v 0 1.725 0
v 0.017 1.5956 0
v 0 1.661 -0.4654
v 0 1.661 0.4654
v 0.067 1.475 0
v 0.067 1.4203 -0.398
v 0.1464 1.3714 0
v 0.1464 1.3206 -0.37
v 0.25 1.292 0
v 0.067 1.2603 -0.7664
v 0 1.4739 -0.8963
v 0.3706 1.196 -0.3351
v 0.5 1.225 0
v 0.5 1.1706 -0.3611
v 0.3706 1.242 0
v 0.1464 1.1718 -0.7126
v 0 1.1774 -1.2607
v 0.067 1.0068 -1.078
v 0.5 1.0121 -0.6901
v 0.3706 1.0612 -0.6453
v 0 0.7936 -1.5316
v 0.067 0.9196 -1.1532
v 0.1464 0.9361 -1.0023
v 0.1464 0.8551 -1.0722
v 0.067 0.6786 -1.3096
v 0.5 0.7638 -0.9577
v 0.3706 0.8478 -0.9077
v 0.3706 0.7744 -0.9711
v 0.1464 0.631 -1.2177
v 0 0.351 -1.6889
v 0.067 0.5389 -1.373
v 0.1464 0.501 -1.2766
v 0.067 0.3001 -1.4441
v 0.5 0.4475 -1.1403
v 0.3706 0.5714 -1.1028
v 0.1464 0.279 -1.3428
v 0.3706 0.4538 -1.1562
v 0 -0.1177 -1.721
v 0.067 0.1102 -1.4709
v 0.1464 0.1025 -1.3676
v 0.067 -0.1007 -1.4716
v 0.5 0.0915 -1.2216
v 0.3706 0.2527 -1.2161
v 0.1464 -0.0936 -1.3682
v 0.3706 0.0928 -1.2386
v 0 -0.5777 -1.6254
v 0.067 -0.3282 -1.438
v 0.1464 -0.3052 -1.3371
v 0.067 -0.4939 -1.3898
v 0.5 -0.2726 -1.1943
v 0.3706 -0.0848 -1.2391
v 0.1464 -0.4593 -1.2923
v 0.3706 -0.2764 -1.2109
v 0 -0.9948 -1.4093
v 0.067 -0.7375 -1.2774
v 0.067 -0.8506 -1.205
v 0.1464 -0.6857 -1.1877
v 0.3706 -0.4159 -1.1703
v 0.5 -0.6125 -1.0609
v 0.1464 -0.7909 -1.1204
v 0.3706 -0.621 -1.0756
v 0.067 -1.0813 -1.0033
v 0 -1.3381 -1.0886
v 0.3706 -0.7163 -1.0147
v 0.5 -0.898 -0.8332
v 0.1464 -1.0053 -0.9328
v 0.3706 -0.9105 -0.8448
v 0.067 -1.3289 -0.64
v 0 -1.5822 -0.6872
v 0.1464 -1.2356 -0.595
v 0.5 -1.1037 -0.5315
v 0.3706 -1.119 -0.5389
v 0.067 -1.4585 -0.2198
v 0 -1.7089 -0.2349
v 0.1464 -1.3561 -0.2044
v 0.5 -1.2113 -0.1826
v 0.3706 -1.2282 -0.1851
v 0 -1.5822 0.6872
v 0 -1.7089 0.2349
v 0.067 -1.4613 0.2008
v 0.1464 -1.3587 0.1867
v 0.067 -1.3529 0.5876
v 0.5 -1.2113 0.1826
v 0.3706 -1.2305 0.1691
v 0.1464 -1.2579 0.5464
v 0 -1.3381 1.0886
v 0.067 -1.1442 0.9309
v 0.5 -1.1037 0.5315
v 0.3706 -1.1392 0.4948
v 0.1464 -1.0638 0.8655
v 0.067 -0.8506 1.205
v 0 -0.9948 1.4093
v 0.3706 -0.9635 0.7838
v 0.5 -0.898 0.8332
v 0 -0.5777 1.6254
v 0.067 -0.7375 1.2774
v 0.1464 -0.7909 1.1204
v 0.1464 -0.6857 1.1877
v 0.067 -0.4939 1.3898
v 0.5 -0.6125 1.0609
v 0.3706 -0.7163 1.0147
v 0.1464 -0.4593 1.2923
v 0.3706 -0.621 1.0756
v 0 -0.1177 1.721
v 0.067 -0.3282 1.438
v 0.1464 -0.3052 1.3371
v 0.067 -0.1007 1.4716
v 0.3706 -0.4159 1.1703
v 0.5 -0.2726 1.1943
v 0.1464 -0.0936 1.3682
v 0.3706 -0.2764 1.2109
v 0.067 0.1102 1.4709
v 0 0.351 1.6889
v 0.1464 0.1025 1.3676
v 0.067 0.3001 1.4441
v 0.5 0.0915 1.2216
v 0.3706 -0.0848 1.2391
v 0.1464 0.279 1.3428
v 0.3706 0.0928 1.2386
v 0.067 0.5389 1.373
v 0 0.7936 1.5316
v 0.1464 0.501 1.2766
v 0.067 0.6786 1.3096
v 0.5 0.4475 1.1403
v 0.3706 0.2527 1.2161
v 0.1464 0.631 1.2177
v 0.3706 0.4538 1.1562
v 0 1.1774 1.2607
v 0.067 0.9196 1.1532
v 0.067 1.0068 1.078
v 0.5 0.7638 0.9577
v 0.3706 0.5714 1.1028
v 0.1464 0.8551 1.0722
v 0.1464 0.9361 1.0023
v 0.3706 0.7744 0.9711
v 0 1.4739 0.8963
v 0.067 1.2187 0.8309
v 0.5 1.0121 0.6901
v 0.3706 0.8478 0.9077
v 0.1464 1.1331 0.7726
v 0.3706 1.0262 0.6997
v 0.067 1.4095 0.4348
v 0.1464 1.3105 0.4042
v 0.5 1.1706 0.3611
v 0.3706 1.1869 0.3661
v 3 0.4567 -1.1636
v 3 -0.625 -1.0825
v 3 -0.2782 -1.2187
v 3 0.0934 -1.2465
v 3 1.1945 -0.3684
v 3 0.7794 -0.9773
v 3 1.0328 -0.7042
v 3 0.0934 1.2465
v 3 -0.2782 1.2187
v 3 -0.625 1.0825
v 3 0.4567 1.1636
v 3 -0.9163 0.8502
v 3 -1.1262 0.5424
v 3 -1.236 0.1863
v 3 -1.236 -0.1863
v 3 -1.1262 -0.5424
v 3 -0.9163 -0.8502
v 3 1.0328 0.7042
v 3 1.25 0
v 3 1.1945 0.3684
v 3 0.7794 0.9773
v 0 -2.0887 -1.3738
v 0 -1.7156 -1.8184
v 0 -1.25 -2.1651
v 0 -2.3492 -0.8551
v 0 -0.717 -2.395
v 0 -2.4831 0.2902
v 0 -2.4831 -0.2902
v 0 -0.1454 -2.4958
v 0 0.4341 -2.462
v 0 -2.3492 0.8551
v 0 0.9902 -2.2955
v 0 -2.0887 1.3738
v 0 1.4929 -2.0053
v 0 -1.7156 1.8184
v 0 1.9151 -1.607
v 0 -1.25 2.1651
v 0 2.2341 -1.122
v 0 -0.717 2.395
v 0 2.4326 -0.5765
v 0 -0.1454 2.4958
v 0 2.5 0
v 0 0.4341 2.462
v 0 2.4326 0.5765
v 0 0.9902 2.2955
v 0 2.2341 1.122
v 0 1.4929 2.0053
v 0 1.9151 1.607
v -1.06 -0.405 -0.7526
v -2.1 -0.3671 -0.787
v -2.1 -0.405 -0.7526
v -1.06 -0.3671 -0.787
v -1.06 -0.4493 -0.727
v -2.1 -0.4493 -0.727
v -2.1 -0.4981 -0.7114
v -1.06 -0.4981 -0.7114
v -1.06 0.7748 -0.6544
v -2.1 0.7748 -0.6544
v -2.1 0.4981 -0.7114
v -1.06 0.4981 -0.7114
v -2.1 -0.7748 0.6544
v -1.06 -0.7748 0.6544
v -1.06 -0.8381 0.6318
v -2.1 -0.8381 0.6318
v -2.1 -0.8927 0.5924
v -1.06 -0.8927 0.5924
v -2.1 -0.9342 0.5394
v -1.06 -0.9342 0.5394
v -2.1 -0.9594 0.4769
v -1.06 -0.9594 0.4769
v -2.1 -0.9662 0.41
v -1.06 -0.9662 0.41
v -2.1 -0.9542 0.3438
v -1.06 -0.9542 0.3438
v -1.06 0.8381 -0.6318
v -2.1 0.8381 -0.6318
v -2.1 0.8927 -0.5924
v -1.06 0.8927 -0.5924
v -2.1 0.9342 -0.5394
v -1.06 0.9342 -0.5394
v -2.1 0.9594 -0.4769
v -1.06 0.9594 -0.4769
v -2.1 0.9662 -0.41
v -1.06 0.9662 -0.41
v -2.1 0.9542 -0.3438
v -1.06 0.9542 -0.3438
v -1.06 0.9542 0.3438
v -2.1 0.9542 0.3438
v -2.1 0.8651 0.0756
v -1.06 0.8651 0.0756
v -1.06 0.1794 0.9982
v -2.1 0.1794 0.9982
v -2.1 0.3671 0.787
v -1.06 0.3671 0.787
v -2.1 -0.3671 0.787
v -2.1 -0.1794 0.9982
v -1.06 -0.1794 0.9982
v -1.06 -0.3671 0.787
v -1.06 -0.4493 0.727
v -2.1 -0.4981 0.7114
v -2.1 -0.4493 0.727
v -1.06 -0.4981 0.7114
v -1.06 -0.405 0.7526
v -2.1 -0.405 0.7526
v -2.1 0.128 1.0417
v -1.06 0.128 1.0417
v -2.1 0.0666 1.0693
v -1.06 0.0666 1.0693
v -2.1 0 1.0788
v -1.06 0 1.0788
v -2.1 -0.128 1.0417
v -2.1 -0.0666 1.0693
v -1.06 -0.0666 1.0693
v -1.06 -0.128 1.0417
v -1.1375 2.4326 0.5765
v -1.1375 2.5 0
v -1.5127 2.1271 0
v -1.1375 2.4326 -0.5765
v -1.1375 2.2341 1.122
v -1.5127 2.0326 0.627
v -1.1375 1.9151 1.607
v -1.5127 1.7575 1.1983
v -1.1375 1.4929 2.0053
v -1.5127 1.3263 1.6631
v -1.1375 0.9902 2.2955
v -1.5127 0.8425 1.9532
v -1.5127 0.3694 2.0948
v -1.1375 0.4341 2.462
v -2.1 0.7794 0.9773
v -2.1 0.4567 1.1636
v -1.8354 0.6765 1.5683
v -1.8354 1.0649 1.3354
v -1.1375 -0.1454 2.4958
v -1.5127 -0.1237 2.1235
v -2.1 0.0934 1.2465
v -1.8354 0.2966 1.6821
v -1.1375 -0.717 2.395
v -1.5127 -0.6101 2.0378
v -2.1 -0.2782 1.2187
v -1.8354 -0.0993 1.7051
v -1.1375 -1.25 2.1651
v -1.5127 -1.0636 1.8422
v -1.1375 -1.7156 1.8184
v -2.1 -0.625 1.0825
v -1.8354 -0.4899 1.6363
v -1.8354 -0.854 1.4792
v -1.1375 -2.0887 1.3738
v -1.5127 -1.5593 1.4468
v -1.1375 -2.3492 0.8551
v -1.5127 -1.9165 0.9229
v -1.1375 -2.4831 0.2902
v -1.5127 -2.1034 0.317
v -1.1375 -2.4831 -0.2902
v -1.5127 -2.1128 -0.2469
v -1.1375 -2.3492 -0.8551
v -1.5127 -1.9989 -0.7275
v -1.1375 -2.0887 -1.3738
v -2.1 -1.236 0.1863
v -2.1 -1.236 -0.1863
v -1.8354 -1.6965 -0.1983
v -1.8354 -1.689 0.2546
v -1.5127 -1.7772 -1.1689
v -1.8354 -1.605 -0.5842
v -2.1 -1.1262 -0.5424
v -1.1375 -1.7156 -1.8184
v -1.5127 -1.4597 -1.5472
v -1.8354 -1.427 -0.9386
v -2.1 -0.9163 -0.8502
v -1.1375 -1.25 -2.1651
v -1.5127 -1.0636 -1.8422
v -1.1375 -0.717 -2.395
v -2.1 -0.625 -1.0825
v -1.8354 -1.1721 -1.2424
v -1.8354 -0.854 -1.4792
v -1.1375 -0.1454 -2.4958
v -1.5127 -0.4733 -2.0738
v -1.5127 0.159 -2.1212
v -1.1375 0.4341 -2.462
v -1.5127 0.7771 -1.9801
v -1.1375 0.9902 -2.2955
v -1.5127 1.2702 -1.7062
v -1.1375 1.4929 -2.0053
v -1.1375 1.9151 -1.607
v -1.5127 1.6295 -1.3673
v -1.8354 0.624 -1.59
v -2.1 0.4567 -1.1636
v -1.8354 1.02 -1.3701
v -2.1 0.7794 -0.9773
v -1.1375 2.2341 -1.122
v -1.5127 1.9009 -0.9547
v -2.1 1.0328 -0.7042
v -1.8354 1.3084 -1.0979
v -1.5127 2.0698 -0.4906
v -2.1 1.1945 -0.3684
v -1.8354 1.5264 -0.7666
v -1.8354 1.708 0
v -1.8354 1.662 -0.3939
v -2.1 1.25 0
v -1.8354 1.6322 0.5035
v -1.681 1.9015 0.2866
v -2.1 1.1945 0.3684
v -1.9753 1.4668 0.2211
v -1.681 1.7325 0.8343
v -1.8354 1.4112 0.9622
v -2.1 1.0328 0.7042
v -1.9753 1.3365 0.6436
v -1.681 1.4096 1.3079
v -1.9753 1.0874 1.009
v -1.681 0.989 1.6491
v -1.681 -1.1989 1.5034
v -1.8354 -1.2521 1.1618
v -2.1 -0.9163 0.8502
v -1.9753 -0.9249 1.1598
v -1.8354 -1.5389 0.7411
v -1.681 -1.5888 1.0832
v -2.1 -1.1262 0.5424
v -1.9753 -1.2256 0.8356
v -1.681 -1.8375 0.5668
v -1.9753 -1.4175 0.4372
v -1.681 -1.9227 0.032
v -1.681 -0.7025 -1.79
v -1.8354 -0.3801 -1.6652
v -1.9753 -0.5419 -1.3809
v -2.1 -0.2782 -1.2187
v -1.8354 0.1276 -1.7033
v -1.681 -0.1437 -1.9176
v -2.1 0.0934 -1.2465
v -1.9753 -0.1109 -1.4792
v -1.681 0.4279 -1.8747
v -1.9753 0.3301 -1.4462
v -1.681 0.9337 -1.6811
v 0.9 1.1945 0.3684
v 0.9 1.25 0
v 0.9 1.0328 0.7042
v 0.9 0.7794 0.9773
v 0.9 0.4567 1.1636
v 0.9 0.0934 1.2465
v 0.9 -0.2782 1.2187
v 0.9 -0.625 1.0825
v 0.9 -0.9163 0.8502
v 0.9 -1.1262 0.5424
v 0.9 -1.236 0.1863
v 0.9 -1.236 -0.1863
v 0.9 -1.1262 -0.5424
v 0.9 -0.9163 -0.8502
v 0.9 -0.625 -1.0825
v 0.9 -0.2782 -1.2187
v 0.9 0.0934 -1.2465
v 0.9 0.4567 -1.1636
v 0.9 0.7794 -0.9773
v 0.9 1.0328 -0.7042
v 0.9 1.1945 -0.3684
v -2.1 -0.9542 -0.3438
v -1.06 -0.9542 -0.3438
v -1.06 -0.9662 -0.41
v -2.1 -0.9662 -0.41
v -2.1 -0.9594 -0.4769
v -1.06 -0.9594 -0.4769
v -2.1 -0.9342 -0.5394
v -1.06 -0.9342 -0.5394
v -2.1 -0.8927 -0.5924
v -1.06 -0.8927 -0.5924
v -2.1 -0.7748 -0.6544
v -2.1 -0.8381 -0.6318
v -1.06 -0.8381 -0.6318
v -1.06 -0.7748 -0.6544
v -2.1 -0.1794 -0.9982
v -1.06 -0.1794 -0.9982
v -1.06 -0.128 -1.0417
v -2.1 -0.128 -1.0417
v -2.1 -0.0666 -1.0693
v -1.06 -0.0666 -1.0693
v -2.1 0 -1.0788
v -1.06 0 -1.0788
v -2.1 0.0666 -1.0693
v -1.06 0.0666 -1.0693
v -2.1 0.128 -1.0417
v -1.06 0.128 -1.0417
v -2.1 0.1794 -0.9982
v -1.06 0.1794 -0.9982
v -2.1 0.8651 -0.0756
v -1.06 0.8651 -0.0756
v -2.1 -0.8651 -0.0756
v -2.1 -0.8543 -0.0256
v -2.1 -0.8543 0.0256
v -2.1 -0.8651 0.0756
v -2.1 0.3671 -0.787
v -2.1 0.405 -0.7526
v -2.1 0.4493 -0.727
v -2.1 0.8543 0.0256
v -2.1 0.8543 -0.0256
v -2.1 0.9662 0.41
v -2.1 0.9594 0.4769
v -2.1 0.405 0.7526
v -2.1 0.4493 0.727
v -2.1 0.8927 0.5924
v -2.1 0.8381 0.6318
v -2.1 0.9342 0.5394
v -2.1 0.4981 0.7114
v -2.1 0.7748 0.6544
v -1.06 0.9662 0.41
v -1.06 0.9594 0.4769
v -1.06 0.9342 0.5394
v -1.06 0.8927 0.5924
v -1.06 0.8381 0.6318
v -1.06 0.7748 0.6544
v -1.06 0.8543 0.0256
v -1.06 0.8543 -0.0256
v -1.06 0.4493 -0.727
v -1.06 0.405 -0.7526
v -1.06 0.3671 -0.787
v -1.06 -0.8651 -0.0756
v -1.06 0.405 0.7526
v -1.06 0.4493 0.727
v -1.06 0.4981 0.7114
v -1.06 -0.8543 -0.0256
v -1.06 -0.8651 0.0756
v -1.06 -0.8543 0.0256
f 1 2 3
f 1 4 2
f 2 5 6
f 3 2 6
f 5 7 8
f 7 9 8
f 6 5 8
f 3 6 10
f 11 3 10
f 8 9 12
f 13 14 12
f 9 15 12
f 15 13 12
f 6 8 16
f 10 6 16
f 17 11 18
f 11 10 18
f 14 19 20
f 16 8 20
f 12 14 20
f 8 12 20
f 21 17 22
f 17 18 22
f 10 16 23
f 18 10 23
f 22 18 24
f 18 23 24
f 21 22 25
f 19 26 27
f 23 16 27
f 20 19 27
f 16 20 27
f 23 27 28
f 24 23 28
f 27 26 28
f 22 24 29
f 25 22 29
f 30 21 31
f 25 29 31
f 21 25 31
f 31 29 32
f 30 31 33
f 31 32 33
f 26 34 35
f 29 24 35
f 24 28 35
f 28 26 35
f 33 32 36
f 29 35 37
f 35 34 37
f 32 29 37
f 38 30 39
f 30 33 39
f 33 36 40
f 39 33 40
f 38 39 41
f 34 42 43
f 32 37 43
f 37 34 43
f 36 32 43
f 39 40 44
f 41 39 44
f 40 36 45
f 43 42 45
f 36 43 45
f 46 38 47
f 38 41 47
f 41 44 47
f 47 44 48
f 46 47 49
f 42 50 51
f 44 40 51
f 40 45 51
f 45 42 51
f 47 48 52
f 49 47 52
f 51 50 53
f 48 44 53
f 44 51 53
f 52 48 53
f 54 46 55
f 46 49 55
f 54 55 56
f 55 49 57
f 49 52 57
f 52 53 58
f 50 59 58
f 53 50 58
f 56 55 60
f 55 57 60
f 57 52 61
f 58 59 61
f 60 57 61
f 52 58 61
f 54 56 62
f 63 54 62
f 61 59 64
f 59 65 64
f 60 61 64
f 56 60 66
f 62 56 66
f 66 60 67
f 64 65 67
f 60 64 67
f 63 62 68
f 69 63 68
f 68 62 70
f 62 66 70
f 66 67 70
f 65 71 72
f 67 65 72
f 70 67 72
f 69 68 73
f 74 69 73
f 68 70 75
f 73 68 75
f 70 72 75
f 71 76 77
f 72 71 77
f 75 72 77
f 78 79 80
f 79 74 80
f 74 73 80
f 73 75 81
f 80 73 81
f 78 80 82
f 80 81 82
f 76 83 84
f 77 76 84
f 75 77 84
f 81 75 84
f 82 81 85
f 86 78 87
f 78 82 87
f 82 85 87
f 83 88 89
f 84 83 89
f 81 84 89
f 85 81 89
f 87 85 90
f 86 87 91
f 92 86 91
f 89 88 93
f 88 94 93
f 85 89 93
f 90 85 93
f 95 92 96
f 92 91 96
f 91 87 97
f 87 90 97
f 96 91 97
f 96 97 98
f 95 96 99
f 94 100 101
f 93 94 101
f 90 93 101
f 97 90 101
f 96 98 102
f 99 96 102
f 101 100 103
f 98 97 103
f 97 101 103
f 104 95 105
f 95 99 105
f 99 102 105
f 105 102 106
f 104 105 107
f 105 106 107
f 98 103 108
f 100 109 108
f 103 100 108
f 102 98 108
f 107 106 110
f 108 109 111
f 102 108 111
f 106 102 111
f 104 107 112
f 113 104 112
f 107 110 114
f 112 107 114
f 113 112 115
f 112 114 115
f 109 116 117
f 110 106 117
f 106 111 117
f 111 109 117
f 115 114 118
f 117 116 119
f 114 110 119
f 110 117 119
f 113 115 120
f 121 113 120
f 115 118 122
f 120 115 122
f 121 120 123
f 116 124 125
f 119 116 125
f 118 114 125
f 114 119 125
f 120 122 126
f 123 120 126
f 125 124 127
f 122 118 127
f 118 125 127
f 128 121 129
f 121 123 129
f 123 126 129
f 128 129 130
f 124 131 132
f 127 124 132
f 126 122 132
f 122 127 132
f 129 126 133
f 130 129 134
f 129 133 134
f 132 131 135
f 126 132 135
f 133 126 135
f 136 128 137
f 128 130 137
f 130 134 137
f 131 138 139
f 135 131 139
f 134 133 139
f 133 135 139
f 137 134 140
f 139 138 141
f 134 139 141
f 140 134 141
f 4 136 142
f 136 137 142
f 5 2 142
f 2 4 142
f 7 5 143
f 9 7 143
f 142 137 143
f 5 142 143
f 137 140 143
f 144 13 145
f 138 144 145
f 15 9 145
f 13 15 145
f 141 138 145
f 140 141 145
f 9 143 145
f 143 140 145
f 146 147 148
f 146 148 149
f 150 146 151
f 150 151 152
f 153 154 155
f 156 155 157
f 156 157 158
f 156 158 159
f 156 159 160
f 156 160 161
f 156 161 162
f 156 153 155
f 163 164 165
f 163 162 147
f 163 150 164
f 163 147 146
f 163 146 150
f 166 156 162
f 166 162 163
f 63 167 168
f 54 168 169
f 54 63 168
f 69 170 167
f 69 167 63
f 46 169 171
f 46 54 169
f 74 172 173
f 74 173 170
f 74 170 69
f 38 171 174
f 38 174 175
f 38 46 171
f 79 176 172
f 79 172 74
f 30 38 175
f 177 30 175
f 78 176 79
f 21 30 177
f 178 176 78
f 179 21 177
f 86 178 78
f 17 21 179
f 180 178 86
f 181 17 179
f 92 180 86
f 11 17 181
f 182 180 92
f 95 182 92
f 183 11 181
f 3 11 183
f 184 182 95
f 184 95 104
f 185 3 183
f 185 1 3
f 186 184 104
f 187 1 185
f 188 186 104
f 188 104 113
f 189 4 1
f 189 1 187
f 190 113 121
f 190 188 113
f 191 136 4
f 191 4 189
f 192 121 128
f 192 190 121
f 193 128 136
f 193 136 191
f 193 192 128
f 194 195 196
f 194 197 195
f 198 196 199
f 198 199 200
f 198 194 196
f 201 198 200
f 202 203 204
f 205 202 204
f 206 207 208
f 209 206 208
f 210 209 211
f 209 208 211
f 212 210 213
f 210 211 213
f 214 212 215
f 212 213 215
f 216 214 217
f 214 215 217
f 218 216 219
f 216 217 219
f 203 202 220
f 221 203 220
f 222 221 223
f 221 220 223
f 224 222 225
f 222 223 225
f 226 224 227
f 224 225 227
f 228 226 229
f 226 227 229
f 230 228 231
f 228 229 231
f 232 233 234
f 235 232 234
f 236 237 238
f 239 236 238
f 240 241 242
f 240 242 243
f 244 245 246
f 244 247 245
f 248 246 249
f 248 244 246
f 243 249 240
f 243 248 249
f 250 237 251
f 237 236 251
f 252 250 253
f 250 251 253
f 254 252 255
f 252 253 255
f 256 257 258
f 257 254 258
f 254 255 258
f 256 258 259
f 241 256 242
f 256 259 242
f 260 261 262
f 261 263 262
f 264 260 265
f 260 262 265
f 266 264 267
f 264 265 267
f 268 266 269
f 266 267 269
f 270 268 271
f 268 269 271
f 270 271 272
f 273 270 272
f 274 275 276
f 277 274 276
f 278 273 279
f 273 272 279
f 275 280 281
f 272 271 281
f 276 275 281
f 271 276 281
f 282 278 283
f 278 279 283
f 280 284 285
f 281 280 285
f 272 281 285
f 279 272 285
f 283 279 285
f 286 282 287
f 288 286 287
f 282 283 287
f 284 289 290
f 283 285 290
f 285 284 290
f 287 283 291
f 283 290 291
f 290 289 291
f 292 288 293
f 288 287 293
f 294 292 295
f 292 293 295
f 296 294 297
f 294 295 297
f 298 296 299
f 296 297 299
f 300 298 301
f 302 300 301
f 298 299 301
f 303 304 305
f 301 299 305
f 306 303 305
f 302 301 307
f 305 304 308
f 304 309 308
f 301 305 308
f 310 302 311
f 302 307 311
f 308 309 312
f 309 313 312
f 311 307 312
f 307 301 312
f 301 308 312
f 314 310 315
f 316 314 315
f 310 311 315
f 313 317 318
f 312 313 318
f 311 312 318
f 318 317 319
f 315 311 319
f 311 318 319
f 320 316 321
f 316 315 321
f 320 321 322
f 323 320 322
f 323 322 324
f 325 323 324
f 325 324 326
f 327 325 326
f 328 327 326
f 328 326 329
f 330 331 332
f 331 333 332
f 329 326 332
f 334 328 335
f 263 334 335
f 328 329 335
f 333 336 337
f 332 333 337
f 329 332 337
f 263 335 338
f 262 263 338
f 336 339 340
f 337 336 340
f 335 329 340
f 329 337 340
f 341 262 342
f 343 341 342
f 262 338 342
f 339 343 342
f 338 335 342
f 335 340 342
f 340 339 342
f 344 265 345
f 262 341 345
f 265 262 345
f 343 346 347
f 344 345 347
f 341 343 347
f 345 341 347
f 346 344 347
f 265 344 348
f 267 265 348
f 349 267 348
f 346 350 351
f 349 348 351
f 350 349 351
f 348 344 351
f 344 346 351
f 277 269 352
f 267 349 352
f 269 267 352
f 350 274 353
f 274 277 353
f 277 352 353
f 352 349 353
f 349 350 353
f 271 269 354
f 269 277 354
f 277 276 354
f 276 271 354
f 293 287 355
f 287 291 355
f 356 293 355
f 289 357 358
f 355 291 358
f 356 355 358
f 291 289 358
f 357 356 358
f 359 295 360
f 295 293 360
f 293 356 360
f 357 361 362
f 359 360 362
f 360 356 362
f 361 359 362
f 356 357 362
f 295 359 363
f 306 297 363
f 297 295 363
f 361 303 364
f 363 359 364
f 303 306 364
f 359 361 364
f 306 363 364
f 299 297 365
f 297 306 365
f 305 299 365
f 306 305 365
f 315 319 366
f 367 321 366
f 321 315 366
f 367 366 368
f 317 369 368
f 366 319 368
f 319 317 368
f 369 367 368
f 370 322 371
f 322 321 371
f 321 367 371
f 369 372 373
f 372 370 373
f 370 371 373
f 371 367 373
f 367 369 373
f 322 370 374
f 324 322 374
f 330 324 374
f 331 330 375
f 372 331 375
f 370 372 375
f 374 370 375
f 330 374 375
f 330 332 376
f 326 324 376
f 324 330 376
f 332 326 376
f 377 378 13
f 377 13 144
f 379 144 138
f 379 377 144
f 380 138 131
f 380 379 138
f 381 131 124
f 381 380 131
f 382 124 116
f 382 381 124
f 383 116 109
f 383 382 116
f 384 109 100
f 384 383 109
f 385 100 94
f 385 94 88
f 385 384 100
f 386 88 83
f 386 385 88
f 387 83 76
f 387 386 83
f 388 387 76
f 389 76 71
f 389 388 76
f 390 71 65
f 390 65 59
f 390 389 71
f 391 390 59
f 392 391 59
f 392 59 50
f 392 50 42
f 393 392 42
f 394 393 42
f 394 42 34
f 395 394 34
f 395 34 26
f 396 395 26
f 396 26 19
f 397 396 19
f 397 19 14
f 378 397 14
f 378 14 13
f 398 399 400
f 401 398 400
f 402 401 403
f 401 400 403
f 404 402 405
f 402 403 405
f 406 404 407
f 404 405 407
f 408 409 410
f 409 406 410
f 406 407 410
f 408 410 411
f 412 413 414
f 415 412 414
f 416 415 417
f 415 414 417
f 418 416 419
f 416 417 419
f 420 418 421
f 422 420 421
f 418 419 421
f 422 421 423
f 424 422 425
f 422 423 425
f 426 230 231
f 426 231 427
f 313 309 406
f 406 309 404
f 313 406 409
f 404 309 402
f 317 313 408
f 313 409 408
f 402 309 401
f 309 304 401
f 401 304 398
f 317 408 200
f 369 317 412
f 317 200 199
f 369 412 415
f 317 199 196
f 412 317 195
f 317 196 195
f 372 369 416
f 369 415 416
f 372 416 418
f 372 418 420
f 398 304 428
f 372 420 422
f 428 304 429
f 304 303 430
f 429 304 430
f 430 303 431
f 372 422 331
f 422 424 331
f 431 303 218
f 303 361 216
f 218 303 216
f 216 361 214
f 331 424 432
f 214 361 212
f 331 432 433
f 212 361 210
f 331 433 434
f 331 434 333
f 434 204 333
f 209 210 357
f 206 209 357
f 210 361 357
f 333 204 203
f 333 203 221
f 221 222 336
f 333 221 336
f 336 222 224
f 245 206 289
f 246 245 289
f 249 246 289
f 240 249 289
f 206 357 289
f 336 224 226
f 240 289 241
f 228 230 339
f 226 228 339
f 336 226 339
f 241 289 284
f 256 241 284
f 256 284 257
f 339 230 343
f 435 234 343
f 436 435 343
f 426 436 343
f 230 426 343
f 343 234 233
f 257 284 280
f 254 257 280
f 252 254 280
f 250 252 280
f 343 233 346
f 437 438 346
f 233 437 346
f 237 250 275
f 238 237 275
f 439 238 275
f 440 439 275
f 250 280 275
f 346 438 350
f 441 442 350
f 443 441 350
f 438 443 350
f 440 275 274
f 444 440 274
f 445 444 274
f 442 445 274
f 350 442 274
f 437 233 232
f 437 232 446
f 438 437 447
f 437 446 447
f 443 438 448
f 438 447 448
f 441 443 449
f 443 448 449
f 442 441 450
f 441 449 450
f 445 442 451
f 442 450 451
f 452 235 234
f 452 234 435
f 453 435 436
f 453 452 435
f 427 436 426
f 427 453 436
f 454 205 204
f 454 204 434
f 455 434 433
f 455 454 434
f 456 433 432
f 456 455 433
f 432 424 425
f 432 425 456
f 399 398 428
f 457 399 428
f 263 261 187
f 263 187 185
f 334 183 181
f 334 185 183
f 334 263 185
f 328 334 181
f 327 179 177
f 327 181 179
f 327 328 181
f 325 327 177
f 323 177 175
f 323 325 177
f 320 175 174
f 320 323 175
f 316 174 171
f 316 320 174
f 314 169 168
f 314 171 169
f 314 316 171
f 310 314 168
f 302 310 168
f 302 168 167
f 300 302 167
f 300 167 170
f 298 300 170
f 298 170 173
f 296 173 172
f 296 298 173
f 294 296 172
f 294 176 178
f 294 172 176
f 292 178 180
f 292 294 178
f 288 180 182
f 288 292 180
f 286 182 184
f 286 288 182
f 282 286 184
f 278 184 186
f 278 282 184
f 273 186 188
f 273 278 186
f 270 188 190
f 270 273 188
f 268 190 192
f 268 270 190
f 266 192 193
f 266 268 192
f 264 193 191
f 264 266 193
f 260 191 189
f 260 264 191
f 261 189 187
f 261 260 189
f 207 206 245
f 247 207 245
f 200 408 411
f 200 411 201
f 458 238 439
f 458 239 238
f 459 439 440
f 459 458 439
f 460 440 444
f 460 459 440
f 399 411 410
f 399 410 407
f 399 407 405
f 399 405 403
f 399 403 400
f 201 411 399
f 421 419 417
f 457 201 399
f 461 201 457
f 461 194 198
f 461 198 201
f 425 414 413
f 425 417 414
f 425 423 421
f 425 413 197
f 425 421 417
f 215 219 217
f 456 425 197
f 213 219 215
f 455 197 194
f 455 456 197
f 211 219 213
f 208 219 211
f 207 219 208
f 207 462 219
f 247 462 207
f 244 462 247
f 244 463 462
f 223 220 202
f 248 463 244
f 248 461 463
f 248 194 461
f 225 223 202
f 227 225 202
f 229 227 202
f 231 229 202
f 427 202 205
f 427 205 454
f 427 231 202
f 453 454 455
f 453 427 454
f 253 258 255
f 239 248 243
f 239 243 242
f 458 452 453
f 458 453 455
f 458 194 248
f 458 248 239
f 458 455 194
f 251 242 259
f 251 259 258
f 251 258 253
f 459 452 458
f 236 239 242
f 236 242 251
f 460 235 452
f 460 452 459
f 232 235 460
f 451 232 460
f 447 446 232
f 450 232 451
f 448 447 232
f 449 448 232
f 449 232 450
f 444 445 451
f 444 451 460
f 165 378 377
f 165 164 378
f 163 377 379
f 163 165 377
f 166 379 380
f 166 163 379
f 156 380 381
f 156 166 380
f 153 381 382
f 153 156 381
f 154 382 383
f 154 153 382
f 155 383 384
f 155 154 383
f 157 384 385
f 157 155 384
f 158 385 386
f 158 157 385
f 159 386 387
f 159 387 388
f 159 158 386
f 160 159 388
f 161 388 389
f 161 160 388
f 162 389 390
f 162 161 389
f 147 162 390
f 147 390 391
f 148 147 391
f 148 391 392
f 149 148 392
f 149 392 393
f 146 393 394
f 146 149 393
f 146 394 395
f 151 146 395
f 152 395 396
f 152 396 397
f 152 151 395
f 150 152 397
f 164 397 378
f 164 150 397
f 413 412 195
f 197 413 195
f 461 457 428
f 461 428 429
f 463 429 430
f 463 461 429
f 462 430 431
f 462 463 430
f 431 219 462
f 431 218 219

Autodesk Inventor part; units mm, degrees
ref_plane "YZ Plane" through (0, 0, 0) normal (1, 0, 0) x (0, 1, 0)
ref_plane "XZ Plane" through (0, 0, 0) normal (0, 1, 0) x (-1, 0, 0)
ref_plane "XY Plane" through (0, 0, 0) normal (0, 0, 1) x (1, 0, 0)
sketch "Sketch4" plane through (0, 0, 0) normal (0, 0, 1) x (1, 0, 0)
  line L0 (-2.1, 0) -> (3, 0)
  line L1 (0, 0) -> (-2.1, 0)
  line L2 (0, 2.5) -> (0, 1.725)
  line L3 (0.5, 1.225) -> (0.5, 1.225)
  line L4 (0.5, 1.225) -> (0.9, 1.25)
  arc A0 (0, 1.725) -> (0.5, 1.225) centre (0.5, 1.725) ccw
  line L5 (-2.1, 0) -> (-2.1, 1.25)
  line L6 (0, 2.5) -> (-1.1375, 2.5)
  arc A1 (-1.1375, 2.5) -> (-2.1, 1.25) centre (1.4883, -0.5175) ccw
  line L7 (0.9, 1.25) -> (3, 1.25)
  line L8 (3, 1.25) -> (3, 0)
  point P0 (0, 1.225)
  dimension "d71" = 0.5
  dimension "d72" = 3
  dimension "d74" = 0.4
  dimension "d75" = 2.45
  dimension "d78" = 2.5
  dimension "d82" = 4
  dimension "d83" = 2.1
  dimension "d84" = 5
  dimension "d104" = 2.1
  dimension "d105" = 2.5
revolve "Revolution7" add sketch "Sketch4" angle 360 about axis through (-2.1, 0, 0) along (1, 0, 0)
sketch "Sketch5" plane through (-2.1, 0, 0) normal (-1, 0, 0) x (0, 0, 1)
  circle A0 centre (0, 0) radius 1.2 construction
  circle A1 centre (0, 0) radius 0.84 construction
  line L0 (0, 0) -> (-0.7275, 0.42)
  line L1 (0, 0) -> (-0.7275, -0.42)
  line L2 (-1.8008, 0) -> (1.7887, 0)
  line L3 (-1.2, 0) -> (-0.7275, -0.42)
  line L4 (-1.2, 0) -> (-0.7275, 0.42)
  dimension "d88" = 2.4
  dimension "d89" = 1.68
  dimension "d90" = 30
  dimension "d91" = 30
extrude "Extrusion1" cut sketch "Sketch5" against normal blind 1.04
pattern_circular "Circular Pattern1" count 6 over 360 about axis through (-10, 0, 0) along (1, 0, 0) of "Extrusion1"
fillet "Fillet1" radius 0.24 12 edges at (-1.58, -1.0392, -0.6) (-1.58, -0.42, -0.7275) (-1.58, -0.84, 0) (-1.58, -1.0392, 0.6) (-1.58, -0.42, 0.7275) (-1.58, 0, 1.2) (-1.58, 0.84, 0) (-1.58, 1.0392, 0.6) (-1.58, 0.42, 0.7275) (-1.58, 0.42, -0.7275) (-1.58, 0, -1.2) (-1.58, 1.0392, -0.6)
thread "Thread7" size "M2.5x0.45" class "6g" standard "ISO Metric profile" length 2.1
properties part number "Flachkopfschraube mit Innenrund ISO 14583 - M2,5 x 3 - 4.8" material "Stahl"
